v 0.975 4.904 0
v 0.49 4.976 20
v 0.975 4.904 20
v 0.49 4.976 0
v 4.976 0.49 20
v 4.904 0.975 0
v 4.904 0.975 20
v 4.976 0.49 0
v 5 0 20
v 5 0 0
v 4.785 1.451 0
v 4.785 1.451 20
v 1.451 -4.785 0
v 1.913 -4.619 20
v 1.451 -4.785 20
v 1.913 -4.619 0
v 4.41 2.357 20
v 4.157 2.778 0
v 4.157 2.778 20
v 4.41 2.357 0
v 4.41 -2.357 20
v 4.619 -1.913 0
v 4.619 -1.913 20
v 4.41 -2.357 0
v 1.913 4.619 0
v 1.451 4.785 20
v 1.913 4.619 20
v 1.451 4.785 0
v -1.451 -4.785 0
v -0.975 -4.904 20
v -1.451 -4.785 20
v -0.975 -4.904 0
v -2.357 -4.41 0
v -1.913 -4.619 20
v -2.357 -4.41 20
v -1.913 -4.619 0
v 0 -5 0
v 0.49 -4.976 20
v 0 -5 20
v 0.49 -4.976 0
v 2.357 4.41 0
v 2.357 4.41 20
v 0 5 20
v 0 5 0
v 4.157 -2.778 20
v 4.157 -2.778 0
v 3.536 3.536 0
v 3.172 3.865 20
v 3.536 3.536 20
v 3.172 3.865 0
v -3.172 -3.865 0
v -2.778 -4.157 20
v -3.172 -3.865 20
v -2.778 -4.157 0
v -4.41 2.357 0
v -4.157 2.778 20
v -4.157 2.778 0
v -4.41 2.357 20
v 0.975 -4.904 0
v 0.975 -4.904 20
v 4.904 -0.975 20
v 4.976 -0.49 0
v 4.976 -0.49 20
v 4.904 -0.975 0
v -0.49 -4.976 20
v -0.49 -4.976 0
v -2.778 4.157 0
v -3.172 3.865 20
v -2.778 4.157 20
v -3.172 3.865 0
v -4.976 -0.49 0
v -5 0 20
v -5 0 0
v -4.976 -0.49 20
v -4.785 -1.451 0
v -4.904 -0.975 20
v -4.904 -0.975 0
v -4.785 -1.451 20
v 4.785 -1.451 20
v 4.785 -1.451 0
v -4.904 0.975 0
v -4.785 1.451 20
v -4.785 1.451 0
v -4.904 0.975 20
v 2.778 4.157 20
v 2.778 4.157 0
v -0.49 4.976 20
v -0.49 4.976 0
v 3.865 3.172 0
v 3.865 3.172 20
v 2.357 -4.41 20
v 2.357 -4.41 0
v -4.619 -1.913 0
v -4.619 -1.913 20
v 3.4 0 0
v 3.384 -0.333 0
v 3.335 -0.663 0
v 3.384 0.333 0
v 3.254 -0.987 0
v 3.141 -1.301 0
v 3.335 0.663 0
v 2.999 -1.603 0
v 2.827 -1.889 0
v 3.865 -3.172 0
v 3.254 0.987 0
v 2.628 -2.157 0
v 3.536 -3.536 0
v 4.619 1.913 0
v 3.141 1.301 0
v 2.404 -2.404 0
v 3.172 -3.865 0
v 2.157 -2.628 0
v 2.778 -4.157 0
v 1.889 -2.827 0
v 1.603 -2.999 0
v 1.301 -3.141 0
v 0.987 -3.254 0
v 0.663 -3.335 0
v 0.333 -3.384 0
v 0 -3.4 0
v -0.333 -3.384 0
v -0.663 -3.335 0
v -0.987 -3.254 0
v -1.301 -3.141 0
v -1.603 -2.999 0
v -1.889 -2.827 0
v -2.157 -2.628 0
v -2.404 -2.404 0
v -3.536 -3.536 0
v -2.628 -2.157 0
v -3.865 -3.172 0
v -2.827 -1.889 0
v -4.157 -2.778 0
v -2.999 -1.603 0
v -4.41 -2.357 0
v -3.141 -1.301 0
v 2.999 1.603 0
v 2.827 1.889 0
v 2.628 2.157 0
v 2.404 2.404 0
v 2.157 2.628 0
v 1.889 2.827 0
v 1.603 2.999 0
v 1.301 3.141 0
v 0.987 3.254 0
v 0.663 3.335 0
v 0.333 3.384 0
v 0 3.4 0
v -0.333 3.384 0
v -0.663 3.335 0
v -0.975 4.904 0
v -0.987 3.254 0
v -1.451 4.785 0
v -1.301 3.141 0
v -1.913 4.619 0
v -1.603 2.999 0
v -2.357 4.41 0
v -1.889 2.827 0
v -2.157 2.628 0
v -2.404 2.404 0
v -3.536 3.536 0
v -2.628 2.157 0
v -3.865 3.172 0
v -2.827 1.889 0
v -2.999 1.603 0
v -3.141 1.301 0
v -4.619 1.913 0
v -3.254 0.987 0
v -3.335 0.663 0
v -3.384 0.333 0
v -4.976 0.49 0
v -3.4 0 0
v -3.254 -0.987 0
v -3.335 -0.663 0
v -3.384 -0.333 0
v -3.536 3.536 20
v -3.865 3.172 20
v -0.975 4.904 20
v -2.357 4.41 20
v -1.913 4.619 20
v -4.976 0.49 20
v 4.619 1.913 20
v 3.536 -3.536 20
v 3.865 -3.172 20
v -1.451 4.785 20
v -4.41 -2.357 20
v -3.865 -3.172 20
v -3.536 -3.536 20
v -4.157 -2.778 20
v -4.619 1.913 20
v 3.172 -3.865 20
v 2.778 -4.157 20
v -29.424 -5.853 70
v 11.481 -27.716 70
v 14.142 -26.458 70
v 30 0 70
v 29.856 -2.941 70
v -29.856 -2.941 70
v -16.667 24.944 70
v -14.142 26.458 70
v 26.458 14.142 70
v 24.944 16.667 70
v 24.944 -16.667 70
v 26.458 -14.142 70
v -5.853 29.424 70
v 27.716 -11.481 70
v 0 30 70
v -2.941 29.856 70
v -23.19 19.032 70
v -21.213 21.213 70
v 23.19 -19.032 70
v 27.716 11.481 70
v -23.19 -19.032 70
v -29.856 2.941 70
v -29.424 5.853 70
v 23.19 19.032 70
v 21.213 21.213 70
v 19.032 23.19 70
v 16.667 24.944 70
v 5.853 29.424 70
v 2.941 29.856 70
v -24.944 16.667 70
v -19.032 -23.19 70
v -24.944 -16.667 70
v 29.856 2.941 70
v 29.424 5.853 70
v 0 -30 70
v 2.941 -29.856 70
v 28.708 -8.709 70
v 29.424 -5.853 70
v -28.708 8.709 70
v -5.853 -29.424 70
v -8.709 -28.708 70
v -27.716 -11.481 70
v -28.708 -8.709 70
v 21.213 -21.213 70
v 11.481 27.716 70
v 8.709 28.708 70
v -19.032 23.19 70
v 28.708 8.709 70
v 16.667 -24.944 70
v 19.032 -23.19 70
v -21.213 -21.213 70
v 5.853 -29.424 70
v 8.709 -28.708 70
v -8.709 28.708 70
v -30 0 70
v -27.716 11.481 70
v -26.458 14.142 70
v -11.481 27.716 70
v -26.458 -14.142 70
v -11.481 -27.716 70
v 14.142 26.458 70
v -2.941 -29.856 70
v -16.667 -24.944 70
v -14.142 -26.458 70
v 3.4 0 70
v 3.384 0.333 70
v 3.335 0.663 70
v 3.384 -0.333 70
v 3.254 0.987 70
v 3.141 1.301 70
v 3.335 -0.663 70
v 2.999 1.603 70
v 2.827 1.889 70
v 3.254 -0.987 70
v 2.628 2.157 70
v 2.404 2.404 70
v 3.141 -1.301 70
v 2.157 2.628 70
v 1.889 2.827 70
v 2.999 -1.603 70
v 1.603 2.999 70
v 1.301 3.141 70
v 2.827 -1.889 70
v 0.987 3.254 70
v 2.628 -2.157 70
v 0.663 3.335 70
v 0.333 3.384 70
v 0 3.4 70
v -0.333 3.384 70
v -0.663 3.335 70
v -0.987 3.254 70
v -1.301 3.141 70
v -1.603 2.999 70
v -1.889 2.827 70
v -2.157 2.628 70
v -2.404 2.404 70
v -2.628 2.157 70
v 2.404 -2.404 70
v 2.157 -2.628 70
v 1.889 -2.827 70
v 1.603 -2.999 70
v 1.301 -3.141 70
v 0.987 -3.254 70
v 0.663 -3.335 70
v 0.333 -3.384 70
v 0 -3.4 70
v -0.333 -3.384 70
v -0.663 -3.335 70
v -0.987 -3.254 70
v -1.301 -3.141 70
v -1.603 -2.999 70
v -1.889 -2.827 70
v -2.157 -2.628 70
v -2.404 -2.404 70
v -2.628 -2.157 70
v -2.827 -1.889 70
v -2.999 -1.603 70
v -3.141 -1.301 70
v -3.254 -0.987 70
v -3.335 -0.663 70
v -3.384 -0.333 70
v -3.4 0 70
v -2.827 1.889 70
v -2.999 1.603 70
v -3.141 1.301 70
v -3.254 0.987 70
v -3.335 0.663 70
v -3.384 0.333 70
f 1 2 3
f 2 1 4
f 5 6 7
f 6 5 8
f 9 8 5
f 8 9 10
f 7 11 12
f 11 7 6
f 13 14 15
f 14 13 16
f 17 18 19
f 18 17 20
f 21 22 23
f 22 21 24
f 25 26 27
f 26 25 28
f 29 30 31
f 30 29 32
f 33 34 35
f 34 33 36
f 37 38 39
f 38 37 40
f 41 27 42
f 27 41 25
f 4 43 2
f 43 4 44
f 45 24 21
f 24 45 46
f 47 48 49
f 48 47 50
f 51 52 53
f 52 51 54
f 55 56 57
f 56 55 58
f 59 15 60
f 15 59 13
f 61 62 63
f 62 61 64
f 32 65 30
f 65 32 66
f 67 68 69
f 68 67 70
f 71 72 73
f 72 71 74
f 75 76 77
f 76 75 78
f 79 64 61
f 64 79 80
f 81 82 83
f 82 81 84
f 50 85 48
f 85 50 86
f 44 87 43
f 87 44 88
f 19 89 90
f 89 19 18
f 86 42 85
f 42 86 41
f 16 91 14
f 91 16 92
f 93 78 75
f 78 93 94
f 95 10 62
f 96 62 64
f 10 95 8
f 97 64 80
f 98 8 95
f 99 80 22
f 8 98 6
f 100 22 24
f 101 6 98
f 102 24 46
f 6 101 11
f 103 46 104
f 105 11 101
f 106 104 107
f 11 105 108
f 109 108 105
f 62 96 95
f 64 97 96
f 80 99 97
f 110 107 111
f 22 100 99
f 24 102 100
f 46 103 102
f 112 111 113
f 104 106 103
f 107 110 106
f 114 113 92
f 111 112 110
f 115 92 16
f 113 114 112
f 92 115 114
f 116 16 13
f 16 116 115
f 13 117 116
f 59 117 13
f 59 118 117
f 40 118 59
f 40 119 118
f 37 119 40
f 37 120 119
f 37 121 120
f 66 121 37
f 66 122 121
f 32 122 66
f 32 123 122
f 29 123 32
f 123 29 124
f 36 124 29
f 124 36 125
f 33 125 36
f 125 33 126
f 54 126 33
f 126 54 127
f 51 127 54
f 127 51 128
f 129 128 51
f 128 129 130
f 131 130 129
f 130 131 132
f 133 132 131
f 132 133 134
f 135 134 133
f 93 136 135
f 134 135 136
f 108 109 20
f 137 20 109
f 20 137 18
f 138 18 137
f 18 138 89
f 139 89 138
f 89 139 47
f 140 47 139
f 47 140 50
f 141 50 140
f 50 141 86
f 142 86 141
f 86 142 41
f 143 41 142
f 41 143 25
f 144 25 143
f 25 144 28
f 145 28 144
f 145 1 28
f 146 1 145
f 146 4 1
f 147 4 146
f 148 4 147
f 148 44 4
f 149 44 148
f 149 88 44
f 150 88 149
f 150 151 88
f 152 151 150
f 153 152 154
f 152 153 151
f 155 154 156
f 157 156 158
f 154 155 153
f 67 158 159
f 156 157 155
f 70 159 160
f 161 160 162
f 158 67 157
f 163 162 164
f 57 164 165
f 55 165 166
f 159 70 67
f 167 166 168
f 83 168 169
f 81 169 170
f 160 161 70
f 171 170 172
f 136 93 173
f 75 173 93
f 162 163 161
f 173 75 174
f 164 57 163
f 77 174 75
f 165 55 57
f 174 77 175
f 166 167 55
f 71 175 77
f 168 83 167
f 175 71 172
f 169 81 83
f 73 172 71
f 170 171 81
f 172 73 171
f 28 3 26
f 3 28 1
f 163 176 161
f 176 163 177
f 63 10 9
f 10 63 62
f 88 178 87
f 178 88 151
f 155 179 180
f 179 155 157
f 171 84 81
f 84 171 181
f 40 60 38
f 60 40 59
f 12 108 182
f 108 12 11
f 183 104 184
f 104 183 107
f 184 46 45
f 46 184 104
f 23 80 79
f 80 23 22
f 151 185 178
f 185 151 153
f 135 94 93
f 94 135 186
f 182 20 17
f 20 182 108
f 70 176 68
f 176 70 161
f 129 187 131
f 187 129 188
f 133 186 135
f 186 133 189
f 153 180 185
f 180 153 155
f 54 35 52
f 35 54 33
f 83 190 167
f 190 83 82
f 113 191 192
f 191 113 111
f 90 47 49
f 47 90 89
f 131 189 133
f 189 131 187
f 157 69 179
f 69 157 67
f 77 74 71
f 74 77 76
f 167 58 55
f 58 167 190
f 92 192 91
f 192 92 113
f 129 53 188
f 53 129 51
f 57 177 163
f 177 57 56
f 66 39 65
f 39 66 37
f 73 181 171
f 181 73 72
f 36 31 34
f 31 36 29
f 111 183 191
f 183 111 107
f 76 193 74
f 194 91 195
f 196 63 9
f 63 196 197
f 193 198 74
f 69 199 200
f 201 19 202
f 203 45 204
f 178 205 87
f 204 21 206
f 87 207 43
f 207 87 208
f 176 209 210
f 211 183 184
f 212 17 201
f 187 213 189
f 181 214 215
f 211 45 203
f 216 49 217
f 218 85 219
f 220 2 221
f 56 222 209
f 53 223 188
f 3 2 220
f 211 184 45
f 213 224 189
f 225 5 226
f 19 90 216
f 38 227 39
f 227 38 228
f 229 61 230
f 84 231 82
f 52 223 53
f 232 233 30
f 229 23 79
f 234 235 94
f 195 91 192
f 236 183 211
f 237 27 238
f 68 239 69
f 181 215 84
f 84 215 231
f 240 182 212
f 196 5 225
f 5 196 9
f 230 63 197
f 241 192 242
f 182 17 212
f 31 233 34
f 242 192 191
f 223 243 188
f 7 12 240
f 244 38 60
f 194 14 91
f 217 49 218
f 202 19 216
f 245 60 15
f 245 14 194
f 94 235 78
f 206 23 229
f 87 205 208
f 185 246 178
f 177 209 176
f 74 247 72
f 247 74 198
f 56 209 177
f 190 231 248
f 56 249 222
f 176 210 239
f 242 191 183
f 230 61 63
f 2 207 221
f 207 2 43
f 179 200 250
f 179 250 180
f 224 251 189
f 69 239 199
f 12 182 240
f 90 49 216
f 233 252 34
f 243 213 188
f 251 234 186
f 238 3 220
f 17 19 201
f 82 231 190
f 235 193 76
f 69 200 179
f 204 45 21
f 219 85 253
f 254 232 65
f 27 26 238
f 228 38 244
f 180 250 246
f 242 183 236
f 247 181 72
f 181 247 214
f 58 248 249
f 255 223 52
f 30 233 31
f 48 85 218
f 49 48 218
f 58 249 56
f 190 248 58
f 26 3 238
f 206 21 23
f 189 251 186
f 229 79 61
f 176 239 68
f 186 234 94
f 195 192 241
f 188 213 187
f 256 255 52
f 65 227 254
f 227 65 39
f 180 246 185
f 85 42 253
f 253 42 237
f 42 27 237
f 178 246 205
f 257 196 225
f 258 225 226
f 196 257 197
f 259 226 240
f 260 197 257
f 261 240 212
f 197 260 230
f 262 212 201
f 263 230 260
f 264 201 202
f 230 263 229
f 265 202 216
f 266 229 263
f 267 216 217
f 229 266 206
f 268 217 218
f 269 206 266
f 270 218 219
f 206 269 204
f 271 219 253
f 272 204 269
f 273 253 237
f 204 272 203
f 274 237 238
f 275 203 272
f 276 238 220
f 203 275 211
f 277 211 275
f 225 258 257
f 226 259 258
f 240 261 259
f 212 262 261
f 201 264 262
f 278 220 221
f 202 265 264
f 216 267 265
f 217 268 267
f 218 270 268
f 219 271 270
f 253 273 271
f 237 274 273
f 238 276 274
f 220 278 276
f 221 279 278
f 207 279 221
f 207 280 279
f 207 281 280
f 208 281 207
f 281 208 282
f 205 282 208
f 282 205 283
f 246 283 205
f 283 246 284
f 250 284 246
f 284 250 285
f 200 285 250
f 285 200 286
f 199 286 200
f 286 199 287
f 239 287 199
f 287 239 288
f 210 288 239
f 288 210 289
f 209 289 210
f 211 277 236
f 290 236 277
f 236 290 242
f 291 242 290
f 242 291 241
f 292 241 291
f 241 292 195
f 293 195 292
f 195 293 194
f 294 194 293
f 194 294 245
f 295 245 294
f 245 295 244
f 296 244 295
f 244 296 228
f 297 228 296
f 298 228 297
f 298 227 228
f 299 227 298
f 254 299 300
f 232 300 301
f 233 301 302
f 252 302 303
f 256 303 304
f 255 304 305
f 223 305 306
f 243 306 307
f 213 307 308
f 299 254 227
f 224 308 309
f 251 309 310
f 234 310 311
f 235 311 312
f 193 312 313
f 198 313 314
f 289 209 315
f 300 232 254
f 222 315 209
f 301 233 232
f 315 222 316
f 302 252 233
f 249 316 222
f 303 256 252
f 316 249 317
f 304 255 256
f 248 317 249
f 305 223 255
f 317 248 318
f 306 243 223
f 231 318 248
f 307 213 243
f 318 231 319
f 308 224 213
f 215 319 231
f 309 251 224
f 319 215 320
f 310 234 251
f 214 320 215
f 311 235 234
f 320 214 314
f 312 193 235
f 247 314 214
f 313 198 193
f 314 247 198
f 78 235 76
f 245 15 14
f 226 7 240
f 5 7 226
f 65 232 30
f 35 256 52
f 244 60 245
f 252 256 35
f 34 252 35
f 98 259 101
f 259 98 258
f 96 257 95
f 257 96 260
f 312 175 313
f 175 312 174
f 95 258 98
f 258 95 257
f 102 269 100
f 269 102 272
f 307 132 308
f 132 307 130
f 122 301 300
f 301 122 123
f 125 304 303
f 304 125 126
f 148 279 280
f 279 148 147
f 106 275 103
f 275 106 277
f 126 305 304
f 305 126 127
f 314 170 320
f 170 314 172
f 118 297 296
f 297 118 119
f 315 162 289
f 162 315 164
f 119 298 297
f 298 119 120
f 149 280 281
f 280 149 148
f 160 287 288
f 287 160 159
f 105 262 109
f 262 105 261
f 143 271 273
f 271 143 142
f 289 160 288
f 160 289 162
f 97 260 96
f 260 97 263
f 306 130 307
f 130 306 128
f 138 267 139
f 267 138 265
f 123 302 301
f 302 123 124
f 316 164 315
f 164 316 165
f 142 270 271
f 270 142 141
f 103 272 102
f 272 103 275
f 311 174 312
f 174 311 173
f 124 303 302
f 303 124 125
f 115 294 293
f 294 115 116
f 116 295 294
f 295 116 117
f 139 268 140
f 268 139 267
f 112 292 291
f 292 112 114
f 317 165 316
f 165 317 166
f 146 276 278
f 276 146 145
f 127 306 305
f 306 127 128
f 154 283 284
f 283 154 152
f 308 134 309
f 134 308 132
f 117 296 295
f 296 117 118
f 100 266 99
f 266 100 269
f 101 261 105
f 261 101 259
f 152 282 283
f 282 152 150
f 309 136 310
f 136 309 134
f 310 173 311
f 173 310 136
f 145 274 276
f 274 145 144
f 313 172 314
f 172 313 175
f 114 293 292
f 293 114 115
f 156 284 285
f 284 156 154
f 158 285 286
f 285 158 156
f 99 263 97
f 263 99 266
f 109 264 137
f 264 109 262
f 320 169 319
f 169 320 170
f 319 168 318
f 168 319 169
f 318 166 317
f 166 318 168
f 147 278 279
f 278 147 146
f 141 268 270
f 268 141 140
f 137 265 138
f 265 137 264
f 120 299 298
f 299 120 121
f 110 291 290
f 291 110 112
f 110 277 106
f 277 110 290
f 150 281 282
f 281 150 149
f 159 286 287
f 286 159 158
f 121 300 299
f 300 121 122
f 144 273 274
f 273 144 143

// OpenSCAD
// Lab funnel - printed upright, open top and bottom
// Spout: 10 mm outer diameter, z = 0 to 20
// Cone: widens from 10 mm (z = 20) to 60 mm (z = 50)
// Wall: 1.6 mm everywhere

$fn = 64;

// --- Dimensions (mm) ---
spout_od      = 10;   // spout outer diameter
spout_length  = 20;   // spout z = 0 to 20
cone_top_d    = 60;   // cone rim outer diameter at z = 50
cone_bottom_d = 10;   // cone base outer diameter at z = 20
wall          = 1.6;  // wall thickness
cut_extra     = 0.5;  // overshoot for clean cuts

// Derived
spout_id = spout_od - 2 * wall;       // bore diameter
cone_h   = cone_top_d - cone_bottom_d; // cone height (50 mm)

difference() {
    union() {
        // Spout
        cylinder(d = spout_od, h = spout_length);
        // Cone
        translate([0, 0, spout_length])
            cylinder(d1 = cone_bottom_d, d2 = cone_top_d, h = cone_h);
    }
    // Through-bore: spout bore up to z = 20, then expanding bore through cone
    translate([0, 0, -cut_extra])
        linear_extrude(height = spout_length + cone_h + 2 * cut_extra)
            circle(d = spout_id);
}
